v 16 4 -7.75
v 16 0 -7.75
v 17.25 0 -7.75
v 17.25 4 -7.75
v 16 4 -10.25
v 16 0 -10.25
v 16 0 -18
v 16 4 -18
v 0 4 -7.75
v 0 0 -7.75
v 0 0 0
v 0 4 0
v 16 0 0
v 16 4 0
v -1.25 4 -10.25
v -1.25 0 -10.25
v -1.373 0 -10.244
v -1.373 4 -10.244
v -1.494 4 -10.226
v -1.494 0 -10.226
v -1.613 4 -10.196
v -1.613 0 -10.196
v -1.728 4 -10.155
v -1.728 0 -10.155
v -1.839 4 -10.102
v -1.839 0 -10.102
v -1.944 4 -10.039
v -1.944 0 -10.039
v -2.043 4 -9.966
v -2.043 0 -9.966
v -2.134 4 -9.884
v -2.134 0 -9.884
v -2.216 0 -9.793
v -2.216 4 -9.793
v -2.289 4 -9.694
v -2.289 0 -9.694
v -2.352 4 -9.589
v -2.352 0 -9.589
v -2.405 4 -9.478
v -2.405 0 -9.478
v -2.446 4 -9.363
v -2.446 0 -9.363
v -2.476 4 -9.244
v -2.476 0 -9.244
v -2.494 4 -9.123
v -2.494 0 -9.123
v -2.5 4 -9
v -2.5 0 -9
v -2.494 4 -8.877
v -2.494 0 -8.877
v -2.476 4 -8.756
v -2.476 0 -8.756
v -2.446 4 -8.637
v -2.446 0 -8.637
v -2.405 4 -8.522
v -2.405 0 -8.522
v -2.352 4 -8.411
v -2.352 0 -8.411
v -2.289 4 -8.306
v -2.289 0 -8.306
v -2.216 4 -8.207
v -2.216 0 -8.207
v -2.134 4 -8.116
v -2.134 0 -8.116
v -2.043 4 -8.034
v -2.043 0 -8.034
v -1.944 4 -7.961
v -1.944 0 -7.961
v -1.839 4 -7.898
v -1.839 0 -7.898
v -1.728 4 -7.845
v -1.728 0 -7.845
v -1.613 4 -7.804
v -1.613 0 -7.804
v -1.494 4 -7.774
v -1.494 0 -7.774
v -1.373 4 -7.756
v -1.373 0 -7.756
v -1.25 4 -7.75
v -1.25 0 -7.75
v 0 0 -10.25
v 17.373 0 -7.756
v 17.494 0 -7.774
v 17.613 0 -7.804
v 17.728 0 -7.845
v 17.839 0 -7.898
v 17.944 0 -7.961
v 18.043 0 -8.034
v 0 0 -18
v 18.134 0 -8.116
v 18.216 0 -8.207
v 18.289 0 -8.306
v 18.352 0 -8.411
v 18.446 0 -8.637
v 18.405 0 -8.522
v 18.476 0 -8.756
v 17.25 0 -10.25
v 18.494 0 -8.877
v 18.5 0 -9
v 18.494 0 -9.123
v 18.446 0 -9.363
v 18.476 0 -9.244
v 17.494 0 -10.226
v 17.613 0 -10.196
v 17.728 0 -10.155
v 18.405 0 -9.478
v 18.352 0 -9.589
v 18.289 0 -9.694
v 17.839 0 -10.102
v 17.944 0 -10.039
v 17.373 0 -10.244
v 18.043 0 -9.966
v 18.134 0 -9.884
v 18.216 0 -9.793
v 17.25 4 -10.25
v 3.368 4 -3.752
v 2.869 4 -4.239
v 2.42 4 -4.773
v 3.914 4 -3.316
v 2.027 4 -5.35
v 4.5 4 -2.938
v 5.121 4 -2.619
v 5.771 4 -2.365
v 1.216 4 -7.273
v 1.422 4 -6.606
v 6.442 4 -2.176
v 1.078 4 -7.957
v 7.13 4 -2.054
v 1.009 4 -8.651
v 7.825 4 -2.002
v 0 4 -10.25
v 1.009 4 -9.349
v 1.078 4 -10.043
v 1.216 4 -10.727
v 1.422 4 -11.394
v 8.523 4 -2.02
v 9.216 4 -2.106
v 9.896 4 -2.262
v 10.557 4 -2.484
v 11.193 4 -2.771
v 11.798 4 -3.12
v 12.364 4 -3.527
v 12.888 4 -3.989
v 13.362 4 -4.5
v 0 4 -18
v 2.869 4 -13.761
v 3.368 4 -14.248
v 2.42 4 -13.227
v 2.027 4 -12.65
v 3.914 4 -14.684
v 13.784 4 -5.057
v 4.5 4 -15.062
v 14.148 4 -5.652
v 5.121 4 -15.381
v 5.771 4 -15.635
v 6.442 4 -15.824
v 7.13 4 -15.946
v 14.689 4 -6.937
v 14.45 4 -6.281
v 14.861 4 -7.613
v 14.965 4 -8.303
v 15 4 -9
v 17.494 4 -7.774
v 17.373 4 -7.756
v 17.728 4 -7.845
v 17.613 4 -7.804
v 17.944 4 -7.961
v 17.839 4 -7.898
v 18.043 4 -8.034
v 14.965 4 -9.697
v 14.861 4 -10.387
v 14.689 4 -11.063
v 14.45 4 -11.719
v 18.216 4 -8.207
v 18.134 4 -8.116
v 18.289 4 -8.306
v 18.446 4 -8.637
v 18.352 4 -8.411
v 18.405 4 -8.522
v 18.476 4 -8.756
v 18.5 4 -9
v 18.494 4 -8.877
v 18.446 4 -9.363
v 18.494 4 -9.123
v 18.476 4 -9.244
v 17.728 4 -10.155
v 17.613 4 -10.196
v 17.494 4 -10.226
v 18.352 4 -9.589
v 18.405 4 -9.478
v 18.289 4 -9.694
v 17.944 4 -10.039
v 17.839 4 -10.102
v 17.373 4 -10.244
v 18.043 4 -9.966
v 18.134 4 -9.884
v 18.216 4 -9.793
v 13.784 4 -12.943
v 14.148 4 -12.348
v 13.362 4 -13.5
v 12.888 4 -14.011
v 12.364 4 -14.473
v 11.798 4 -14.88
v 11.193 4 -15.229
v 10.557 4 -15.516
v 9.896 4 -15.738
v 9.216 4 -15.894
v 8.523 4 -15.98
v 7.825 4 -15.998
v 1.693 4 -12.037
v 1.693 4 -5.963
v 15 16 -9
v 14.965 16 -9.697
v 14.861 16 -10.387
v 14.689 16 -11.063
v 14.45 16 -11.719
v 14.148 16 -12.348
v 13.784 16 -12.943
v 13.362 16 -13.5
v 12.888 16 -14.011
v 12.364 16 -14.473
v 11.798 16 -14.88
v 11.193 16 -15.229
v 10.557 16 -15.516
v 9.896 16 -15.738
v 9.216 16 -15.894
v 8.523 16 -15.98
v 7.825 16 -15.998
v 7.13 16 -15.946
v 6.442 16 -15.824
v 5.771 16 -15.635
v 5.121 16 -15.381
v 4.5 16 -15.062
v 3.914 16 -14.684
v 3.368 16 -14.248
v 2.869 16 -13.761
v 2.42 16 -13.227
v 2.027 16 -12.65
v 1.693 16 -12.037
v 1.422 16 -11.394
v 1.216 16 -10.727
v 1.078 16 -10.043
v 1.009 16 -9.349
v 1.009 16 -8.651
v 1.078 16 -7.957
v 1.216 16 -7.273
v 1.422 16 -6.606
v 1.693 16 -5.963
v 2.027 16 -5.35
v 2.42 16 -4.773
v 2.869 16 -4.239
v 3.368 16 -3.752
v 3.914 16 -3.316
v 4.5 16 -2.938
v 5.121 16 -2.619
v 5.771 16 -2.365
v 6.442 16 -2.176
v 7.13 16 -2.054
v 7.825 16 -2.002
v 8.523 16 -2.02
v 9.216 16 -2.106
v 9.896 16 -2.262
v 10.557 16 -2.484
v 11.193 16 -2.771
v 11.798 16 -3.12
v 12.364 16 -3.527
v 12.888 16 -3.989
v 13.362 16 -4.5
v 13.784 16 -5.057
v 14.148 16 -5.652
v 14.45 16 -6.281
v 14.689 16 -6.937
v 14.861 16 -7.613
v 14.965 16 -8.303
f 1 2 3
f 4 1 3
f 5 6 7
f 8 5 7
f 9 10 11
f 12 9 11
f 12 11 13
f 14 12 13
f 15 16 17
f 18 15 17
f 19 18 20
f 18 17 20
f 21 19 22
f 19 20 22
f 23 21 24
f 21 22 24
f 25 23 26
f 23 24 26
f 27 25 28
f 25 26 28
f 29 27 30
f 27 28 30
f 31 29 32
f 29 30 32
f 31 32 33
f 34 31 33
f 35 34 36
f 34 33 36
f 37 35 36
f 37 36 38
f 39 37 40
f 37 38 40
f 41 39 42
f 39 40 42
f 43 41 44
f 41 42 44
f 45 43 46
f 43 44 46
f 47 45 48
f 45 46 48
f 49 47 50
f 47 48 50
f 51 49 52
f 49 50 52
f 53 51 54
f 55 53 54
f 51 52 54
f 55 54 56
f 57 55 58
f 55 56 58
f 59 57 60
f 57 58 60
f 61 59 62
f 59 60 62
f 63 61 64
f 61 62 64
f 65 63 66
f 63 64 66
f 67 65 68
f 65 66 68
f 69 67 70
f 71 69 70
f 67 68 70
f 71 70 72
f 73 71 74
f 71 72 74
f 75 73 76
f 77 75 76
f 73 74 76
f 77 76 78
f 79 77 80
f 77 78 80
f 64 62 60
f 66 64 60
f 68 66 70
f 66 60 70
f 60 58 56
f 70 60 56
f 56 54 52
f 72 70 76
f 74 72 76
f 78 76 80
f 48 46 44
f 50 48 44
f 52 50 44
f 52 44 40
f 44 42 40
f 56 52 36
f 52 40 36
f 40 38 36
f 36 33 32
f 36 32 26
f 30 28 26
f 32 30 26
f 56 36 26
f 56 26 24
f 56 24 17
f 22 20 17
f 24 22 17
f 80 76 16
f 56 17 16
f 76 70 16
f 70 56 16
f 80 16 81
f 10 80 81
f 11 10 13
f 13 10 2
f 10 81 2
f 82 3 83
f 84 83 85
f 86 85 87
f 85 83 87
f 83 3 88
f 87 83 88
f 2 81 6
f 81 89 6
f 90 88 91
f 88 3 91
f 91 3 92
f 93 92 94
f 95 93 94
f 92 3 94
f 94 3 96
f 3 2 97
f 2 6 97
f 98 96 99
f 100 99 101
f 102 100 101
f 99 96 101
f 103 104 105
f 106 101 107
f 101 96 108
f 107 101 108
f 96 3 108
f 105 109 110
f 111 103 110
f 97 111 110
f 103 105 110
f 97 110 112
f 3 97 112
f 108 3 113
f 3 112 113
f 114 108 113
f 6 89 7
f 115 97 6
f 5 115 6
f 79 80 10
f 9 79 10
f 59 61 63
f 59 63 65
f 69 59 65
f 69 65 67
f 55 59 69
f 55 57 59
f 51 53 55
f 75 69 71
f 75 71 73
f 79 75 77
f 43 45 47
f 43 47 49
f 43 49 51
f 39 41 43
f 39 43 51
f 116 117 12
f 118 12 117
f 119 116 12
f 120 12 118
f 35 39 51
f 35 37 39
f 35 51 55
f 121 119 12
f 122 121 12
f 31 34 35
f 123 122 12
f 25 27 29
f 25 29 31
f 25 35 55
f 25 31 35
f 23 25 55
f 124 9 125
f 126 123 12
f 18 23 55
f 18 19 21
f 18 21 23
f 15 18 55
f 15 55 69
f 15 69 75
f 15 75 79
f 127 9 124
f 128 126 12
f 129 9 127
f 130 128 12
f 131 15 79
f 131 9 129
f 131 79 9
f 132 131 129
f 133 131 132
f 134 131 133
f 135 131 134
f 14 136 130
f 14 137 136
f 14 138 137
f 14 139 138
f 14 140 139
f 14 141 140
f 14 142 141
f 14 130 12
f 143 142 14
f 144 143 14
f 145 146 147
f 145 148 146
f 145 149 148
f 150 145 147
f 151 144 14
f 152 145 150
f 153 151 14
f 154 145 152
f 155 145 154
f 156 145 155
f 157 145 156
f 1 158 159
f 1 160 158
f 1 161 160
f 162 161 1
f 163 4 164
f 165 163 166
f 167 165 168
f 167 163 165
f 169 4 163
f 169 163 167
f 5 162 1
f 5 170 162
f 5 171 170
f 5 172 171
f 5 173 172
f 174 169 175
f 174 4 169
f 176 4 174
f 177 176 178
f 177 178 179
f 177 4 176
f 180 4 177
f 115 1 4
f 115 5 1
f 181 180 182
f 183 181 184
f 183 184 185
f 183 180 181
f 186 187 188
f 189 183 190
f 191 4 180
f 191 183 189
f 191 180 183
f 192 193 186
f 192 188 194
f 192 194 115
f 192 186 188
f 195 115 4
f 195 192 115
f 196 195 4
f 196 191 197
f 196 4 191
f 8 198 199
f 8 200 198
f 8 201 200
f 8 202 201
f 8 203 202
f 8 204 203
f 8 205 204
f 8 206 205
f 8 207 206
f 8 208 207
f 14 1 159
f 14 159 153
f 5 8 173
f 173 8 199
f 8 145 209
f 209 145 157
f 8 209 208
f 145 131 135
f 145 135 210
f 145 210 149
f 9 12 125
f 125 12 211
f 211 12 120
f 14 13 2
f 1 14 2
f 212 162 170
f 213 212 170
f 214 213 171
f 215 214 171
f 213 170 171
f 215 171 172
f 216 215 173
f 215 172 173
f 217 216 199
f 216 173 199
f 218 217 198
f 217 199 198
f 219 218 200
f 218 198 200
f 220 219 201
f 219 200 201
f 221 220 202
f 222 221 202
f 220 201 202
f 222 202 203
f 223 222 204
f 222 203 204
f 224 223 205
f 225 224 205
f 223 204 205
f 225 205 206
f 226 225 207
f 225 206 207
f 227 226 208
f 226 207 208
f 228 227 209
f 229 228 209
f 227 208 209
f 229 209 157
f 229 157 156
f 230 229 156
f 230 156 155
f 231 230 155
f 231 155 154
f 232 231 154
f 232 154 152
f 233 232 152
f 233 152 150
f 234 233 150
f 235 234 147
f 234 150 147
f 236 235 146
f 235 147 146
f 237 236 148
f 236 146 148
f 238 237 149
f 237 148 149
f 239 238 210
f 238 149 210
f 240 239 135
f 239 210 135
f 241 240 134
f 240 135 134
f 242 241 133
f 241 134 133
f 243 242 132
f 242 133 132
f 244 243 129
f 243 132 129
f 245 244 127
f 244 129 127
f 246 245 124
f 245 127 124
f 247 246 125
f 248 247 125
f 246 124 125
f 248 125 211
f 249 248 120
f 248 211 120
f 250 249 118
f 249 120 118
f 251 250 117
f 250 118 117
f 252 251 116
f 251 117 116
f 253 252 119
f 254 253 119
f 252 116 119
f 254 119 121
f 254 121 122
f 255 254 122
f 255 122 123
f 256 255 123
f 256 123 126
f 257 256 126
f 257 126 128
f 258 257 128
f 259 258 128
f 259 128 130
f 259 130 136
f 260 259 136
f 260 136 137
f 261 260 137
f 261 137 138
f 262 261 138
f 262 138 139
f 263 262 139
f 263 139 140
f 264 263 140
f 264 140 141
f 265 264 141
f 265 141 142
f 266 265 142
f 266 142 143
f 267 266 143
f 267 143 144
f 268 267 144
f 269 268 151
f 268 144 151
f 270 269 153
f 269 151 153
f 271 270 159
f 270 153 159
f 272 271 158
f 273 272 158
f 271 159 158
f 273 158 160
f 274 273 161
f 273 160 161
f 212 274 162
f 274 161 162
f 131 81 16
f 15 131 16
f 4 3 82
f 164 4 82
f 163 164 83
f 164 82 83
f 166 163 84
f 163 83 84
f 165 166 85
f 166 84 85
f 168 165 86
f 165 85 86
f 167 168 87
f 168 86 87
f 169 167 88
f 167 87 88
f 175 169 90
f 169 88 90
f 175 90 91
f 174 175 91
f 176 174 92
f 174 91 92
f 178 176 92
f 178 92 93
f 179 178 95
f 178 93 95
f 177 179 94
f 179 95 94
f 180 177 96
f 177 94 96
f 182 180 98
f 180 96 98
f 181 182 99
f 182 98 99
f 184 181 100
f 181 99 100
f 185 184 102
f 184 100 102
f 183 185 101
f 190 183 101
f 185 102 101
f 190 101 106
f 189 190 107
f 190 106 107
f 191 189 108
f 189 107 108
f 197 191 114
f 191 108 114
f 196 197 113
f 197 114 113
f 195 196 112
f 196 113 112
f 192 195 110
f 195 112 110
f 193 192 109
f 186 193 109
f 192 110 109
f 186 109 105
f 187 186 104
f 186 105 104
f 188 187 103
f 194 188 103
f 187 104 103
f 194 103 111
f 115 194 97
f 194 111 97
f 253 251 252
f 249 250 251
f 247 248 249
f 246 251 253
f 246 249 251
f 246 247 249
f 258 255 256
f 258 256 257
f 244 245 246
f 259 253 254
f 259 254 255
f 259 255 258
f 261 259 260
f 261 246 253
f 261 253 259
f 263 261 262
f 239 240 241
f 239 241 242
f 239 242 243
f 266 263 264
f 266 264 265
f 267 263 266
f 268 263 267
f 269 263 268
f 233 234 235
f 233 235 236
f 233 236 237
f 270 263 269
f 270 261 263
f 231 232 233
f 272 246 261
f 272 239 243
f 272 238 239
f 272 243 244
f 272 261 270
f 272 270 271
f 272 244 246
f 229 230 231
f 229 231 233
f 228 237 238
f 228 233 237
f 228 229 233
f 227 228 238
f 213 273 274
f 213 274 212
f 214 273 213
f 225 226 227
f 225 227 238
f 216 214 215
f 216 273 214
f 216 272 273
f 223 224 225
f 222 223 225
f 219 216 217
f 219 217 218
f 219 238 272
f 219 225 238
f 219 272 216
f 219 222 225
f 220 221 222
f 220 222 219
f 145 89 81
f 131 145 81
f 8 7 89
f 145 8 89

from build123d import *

# Parameters (mm, degrees)
BOSS_EXTRUDE1_DEPTH = 4
SKETCH2_R           = 7
BOSS_EXTRUDE2_DEPTH = 12


with BuildPart() as part:
    # Sketch1 → Boss-Extrude1 (new body)
    with BuildSketch(Plane(origin=(0, 0, 0), x_dir=(1, 0, 0), z_dir=(0, 1, 0))):
        with BuildLine():
            Line((0, 0), (16, 0))
            Line((16, 0), (16, 7.75))
            Line((16, 7.75), (17.25, 7.75))
            ThreePointArc((17.25, 7.75), (18.5, 9), (17.25, 10.25))
            Line((17.25, 10.25), (16, 10.25))
            Line((16, 10.25), (16, 18))
            Line((16, 18), (0, 18))
            Line((0, 18), (0, 10.25))
            Line((0, 10.25), (-1.25, 10.25))
            ThreePointArc((-1.25, 10.25), (-2.5, 9), (-1.25, 7.75))
            Line((-1.25, 7.75), (0, 7.75))
            Line((0, 7.75), (0, 0))
        make_face()
    extrude(amount=BOSS_EXTRUDE1_DEPTH)

    # Sketch2 → Boss-Extrude2 (add)
    with BuildSketch(Plane(origin=(0, 4, 0), x_dir=(1, 0, 0), z_dir=(0, 1, 0))):
        with Locations((8, 9)):
            Circle(SKETCH2_R)
    extrude(amount=BOSS_EXTRUDE2_DEPTH)


solid = part.part
